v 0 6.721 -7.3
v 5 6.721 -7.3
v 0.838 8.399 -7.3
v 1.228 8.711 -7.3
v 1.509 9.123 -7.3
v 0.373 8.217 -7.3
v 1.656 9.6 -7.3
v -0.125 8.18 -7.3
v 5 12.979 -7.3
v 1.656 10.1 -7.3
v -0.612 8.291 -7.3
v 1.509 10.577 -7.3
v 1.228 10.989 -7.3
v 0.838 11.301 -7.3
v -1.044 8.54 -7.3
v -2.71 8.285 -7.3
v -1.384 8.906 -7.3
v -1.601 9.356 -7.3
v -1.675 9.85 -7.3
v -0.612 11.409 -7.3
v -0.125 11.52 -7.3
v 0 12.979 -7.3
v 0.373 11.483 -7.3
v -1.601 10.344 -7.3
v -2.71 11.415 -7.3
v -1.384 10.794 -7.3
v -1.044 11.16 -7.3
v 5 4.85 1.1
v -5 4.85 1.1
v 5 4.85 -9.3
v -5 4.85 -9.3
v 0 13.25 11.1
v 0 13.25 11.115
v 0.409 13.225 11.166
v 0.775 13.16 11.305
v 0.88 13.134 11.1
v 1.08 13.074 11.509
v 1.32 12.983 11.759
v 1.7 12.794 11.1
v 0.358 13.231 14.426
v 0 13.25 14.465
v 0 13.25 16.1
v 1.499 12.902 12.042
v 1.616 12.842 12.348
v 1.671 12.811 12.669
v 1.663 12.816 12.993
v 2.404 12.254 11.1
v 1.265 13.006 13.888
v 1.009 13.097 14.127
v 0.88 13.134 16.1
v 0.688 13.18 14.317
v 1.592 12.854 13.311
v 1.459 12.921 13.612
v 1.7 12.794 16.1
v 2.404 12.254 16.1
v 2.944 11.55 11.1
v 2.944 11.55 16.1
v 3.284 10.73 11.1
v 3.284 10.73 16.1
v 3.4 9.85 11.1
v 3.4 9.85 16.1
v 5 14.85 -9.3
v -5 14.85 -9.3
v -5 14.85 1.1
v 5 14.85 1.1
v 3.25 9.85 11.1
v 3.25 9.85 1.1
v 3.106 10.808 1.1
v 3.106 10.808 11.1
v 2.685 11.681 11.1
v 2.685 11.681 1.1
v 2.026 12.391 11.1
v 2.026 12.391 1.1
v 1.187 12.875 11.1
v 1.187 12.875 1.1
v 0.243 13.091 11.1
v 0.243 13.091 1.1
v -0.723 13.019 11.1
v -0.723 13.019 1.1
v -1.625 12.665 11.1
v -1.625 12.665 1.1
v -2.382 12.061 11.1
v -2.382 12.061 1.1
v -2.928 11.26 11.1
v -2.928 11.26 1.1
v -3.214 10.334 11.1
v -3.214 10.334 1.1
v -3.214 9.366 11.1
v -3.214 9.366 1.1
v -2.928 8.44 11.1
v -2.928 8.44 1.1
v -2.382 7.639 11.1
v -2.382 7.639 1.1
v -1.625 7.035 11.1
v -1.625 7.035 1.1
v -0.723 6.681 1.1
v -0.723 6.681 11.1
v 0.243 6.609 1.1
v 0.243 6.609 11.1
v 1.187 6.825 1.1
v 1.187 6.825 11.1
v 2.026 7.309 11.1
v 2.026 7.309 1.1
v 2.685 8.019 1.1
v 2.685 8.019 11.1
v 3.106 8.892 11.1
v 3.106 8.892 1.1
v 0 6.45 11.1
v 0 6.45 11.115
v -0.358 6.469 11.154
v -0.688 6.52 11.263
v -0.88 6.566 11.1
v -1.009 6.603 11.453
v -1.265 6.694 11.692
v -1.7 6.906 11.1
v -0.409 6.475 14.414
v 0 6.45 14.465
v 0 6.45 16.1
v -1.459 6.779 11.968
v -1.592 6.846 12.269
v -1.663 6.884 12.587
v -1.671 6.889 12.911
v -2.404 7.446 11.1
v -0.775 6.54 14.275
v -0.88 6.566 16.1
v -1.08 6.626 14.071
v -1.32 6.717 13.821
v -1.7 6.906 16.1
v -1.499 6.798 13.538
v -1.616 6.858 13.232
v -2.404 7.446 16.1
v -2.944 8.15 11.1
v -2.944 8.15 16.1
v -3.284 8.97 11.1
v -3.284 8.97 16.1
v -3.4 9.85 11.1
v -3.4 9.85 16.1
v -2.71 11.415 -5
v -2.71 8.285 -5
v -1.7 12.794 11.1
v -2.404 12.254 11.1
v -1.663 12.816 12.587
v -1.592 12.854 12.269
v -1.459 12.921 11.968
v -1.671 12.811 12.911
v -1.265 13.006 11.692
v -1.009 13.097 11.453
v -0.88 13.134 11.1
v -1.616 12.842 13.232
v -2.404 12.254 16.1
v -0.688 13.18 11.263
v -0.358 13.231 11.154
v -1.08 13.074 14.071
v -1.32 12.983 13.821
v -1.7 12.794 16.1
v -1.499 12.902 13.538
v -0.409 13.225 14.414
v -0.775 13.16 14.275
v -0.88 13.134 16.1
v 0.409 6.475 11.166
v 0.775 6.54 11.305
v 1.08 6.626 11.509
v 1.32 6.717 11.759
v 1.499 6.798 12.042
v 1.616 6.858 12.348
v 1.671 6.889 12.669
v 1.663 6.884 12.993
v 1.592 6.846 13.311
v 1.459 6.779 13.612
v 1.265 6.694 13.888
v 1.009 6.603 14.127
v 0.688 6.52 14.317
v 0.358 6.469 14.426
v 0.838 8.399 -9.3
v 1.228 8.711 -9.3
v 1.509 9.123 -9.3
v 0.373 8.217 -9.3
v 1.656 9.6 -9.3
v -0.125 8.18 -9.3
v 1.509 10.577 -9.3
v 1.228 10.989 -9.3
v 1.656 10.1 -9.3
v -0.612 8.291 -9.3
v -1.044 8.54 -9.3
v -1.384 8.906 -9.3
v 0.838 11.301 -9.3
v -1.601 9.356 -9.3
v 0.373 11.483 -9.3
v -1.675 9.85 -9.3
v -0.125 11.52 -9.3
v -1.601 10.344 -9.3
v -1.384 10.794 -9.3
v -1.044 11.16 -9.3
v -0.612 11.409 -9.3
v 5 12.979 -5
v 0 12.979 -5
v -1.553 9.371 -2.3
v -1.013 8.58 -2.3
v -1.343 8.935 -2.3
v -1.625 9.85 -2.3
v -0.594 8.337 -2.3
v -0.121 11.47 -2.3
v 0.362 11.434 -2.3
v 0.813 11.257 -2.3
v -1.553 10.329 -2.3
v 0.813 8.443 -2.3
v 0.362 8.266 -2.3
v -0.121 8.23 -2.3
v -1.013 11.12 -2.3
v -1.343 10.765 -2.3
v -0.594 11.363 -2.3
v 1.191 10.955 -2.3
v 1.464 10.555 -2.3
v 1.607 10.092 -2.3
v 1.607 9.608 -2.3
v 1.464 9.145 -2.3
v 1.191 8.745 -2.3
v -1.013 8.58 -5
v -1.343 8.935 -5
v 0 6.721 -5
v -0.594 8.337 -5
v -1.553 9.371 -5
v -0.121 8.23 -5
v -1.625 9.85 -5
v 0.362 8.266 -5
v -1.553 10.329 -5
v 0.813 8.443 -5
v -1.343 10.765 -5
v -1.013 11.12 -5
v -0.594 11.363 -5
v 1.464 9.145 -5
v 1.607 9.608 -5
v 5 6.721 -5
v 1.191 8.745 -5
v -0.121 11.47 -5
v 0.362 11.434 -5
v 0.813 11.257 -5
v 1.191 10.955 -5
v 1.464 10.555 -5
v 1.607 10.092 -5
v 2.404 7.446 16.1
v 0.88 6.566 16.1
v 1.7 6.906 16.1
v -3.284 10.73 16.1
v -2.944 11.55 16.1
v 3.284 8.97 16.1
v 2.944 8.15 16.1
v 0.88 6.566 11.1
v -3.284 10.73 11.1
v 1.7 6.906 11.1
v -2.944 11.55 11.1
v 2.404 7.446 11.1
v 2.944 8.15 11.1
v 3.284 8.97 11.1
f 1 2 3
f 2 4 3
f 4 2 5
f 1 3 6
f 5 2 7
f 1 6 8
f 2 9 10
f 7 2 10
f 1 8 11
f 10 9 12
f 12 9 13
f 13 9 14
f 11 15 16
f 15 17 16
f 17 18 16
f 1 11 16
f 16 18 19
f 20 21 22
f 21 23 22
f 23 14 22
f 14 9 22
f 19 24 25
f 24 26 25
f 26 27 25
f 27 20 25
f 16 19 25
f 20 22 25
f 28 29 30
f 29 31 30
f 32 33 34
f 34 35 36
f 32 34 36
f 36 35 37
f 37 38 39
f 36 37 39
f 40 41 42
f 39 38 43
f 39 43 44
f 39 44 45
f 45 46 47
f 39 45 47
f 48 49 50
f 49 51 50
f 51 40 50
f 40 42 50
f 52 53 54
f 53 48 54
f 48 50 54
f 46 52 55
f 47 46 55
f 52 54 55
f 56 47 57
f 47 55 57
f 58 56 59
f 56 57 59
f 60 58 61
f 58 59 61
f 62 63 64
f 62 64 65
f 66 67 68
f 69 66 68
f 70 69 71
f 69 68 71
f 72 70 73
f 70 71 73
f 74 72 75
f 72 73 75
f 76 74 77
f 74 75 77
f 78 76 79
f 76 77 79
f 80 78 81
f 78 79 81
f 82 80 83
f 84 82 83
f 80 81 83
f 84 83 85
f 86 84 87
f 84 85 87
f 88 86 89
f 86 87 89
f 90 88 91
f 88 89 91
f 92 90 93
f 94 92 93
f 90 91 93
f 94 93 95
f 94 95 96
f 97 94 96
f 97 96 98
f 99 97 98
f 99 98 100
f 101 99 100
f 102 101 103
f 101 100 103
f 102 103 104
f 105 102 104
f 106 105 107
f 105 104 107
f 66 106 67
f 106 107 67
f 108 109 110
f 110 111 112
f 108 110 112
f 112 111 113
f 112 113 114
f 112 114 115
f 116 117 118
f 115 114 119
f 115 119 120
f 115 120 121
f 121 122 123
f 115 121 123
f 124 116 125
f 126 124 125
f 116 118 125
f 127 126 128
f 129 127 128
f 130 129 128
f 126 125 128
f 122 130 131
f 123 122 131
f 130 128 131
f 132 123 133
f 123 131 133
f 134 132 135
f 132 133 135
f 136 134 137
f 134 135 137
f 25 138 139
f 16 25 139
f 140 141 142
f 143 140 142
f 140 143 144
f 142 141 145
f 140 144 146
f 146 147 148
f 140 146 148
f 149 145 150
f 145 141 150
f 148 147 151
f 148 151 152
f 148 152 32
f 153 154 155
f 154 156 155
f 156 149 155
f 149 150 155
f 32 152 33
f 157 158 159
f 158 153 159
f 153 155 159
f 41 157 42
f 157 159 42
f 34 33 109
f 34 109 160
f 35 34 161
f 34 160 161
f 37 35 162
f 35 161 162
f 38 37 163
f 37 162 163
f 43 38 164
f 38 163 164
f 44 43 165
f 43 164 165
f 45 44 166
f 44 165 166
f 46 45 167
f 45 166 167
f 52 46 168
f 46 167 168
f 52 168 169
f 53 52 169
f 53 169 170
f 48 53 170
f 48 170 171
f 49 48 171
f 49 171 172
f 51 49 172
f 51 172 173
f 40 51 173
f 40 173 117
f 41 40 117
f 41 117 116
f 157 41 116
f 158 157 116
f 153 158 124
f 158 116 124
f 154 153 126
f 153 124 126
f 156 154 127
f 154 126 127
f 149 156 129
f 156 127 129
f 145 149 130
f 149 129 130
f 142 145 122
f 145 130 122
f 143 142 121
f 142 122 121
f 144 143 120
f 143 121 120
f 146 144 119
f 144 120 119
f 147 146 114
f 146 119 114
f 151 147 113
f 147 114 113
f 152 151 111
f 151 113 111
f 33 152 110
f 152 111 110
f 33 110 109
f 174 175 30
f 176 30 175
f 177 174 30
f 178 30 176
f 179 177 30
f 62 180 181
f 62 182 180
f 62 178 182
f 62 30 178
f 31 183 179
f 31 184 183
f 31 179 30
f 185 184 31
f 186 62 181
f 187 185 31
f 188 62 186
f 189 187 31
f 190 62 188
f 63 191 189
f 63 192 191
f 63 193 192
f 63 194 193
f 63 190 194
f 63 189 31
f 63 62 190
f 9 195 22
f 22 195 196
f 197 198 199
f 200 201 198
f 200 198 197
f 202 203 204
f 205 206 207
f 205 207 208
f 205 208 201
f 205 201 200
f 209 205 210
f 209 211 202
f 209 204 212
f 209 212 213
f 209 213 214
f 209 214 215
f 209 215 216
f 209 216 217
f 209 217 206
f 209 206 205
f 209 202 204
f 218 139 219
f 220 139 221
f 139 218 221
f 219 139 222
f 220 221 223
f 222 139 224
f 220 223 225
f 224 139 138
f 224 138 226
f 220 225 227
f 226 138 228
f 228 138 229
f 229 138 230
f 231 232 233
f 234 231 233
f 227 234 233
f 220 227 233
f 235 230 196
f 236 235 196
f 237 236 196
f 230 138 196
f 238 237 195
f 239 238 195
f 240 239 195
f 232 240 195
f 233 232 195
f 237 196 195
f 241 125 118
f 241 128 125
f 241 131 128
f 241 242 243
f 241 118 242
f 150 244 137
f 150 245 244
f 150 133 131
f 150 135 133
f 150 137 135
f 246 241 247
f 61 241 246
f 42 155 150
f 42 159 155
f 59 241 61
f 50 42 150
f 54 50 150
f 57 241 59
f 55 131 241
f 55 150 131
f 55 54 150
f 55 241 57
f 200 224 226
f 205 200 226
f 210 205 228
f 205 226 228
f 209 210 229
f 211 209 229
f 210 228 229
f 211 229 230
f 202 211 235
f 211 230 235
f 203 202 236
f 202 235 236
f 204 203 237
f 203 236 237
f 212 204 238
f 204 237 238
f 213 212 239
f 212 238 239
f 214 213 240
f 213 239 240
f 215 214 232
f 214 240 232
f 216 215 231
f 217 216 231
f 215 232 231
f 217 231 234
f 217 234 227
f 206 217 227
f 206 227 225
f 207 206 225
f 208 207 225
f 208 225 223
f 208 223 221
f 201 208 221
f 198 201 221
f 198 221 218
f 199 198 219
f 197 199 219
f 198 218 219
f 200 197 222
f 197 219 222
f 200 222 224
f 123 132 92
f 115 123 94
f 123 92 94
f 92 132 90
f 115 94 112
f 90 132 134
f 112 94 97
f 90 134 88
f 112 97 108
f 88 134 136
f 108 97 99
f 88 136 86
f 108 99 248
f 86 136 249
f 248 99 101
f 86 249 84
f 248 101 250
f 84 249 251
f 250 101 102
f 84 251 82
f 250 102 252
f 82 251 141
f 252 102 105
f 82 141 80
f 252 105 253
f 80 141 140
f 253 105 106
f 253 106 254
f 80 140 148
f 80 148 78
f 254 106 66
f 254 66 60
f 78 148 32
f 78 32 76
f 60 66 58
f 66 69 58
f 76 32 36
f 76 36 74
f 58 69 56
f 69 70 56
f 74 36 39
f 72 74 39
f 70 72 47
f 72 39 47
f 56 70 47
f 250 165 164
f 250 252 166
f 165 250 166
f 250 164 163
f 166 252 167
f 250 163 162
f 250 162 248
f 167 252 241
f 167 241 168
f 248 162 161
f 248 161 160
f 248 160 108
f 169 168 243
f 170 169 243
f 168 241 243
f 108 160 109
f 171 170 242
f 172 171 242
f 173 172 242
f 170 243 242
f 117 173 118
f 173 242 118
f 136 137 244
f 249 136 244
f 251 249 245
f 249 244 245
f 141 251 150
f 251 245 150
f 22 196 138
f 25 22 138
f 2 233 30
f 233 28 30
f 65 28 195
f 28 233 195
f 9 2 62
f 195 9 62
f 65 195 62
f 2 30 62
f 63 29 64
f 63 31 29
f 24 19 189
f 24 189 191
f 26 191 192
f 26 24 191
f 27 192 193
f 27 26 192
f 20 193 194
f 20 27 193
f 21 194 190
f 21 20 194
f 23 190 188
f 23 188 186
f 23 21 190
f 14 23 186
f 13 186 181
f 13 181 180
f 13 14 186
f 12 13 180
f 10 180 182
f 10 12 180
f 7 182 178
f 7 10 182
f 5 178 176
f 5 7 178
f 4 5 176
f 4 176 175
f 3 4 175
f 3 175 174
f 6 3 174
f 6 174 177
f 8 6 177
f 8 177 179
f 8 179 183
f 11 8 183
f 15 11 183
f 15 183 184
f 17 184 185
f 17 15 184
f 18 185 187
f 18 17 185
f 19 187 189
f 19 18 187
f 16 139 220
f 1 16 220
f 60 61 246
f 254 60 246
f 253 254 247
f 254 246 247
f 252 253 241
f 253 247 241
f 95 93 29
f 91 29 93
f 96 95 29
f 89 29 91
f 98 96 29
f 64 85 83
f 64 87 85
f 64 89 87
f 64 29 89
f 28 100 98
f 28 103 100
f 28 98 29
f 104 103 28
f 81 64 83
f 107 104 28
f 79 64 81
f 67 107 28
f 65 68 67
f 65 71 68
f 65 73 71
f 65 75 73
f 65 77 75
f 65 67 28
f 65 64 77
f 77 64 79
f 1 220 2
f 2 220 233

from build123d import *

# Parameters (mm, degrees)
SKETCH1_W               = 10
SKETCH1_H               = 10
BOSS_EXTRUDE1_DEPTH     = 5
CUT_EXTRUDE1_DEPTH      = 9.660254038
CUT_EXTRUDE1_DEPTH_BACK = 9.660254038
SKETCH2_R               = 1.675
SKETCH3_R               = 1.675
CUT_EXTRUDE3_DEPTH      = 2.3
SKETCH4_W               = 10
SKETCH4_H               = 10
BOSS_EXTRUDE2_DEPTH     = 2.7
SKETCH6_W               = 10
SKETCH6_H               = 10
BOSS_EXTRUDE3_DEPTH     = 7
SKETCH9_R               = 2.15
CUT_EXTRUDE12_DEPTH     = 19.468622038
SKETCH10_R              = 1.675
CUT_EXTRUDE13_DEPTH     = 13.003749414
BOSS_EXTRUDE4_DEPTH     = 2.3
SKETCH12_W              = 10
SKETCH12_H              = 10
BOSS_EXTRUDE5_DEPTH     = 2.7
CUT_EXTRUDE14_START     = -2.7
SKETCH13_R              = 1.675
CUT_EXTRUDE14_DEPTH     = 2.7
SKETCH14_R              = 2.15
BOSS_EXTRUDE6_DEPTH     = 0.76
SKETCH16_W              = 10
SKETCH16_H              = 19.7
CUT_EXTRUDE15_DEPTH     = 2.29
BOSS_EXTRUDE7_START     = 1
SKETCH17_W              = 10
SKETCH17_H              = 7.71
SKETCH17_R              = 1.675
BOSS_EXTRUDE7_DEPTH     = 1
SKETCH18_W              = 10
SKETCH18_H              = 7.71
SKETCH18_R              = 1.675
BOSS_EXTRUDE9_DEPTH     = 1
BOSS_EXTRUDE13_DEPTH    = 2.3
SKETCH23_W              = 10
SKETCH23_H              = 10
SKETCH23_R              = 1.675
BOSS_EXTRUDE15_DEPTH    = 2
SKETCH24_W              = 10
SKETCH24_H              = 5.85
CUT_EXTRUDE16_DEPTH     = 25.448519432
SKETCH25_W              = 10
SKETCH25_H              = 10
BOSS_EXTRUDE16_DEPTH    = 6
SKETCH26_W              = 10
SKETCH26_H              = 10
CUT_EXTRUDE17_DEPTH     = 7.71
SKETCH27_W              = 10
SKETCH27_H              = 10
BOSS_EXTRUDE17_DEPTH    = 6.1
SKETCH28_R              = 3.25
BOSS_EXTRUDE18_DEPTH    = 10
SKETCH29_R              = 1.625
CUT_EXTRUDE18_DEPTH     = 2.7
SKETCH33_W              = 6.8
SKETCH33_H              = 6.8
BOSS_EXTRUDE19_DEPTH    = 5
SKETCH36_R              = 1.675
CUT_EXTRUDE22_DEPTH     = 10
CUT_EXTRUDE23_DEPTH     = 10


with BuildPart() as part:
    # Sketch1 → Boss-Extrude1 (new body)
    with BuildSketch(Plane(origin=(0, 0, 0), x_dir=(1, 0, 0), z_dir=(0, 1, 0))):
        Rectangle(SKETCH1_W, SKETCH1_H)
    extrude(amount=BOSS_EXTRUDE1_DEPTH)

    # Sketch2 → Cut-Extrude1 (cut, two sides: drawn at the far end of the back side and taken through both)
    with BuildSketch(Plane(origin=(0, 5, 0), x_dir=(1, 0, 0), z_dir=(0, 1, 0)).offset(-CUT_EXTRUDE1_DEPTH_BACK)):
        with Locations(Location((0, 0, 0), (0, 0, 270))):
            Circle(SKETCH2_R)
    extrude(amount=CUT_EXTRUDE1_DEPTH + CUT_EXTRUDE1_DEPTH_BACK, mode=Mode.SUBTRACT)

    # Sketch3 → Cut-Extrude3 (cut)
    # profile 1 of 2: a face of its own
    with BuildSketch(Plane(origin=(0, 5, 0), x_dir=(1, 0, 0), z_dir=(0, 1, 0))):
        Polygon((-1.56461923, -2.71), (1.56461923, -2.71), (3.129238459, 0), (1.56461923, 2.71), (-1.56461923, 2.71), (-3.129238459, 0), align=None)
        with Locations(Location((0, 0, 0), (0, 0, 270))):
            Circle(SKETCH3_R, mode=Mode.SUBTRACT)
    # profile 2 of 2: a face of its own
    with BuildSketch(Plane(origin=(0, 5, 0), x_dir=(1, 0, 0), z_dir=(0, 1, 0))):
        Polygon((-1.56461923, -2.71), (-3.129238459, 0), (-3.129238459, -5), (3.129238459, -5), (3.129238459, 0), (1.56461923, -2.71), align=None)
    extrude(amount=-CUT_EXTRUDE3_DEPTH, mode=Mode.SUBTRACT)

    # Sketch4 → Boss-Extrude2 (add)
    with BuildSketch(Plane(origin=(0, 5, 0), x_dir=(1, 0, 0), z_dir=(0, 1, 0))):
        Rectangle(SKETCH4_W, SKETCH4_H)
    extrude(amount=BOSS_EXTRUDE2_DEPTH)

    # Sketch6 → Boss-Extrude3 (add)
    with BuildSketch(Plane(origin=(0, 7.7, 0), x_dir=(1, 0, 0), z_dir=(0, 1, 0))):
        Rectangle(SKETCH6_W, SKETCH6_H)
    extrude(amount=BOSS_EXTRUDE3_DEPTH)

    # Sketch9 → Cut-Extrude12 (cut, through all)
    with BuildSketch(Plane(origin=(0, 0, -5), x_dir=(-1, 0, 0), z_dir=(0, 0, -1))):
        with Locations((0, 9.85)):
            Circle(SKETCH9_R)
    extrude(amount=-CUT_EXTRUDE12_DEPTH, mode=Mode.SUBTRACT)

    # Sketch10 → Cut-Extrude13 (cut, through all)
    with BuildSketch(Plane.XZ.offset(-5)):
        with Locations(Location((0, 0, 0), (0, 0, 90))):
            Circle(SKETCH10_R)
    extrude(amount=-CUT_EXTRUDE13_DEPTH, mode=Mode.SUBTRACT)

    # Sketch11 → Boss-Extrude4 (add)
    with BuildSketch(Plane(origin=(0, 14.7, 0), x_dir=(1, 0, 0), z_dir=(0, 1, 0))):
        Polygon((1.56461923, 2.71), (3.129238459, 0), (3.129238459, -5), (5, -5), (5, 5), (-5, 5), (-5, -5), (-3.129238459, -5), (-3.129238459, 0), (-1.56461923, 2.71), align=None)
    extrude(amount=BOSS_EXTRUDE4_DEPTH)

    # Sketch12 → Boss-Extrude5 (add)
    with BuildSketch(Plane(origin=(0, 17, 0), x_dir=(1, 0, 0), z_dir=(0, 1, 0))):
        Rectangle(SKETCH12_W, SKETCH12_H)
    extrude(amount=BOSS_EXTRUDE5_DEPTH)

    # Sketch13 → Cut-Extrude14 (cut)
    with BuildSketch(Plane(origin=(0, 19.7, 0), x_dir=(1, 0, 0), z_dir=(0, 1, 0)).offset(CUT_EXTRUDE14_START)):
        with Locations(Location((0, 0, 0), (0, 0, 270))):
            Circle(SKETCH13_R)
    extrude(amount=CUT_EXTRUDE14_DEPTH, mode=Mode.SUBTRACT)

    # Sketch16 → Cut-Extrude15 (cut)
    with BuildSketch(Plane.XY.offset(5)):
        with Locations((0, 9.85)):
            Rectangle(SKETCH16_W, SKETCH16_H)
    extrude(amount=-CUT_EXTRUDE15_DEPTH, mode=Mode.SUBTRACT)

    # Sketch17 → Boss-Extrude7 (add)
    with BuildSketch(Plane(origin=(0, 0, 0), x_dir=(-1, 0, 0), z_dir=(0, -1, 0)).offset(BOSS_EXTRUDE7_START)):
        with Locations((0, 1.145)):
            Rectangle(SKETCH17_W, SKETCH17_H)
        with Locations(Location((0, 0, 0), (0, 0, 270))):
            Circle(SKETCH17_R, mode=Mode.SUBTRACT)
    extrude(amount=-BOSS_EXTRUDE7_DEPTH)

    # Sketch18 → Boss-Extrude9 (add)
    with BuildSketch(Plane(origin=(0, 19.7, 0), x_dir=(1, 0, 0), z_dir=(0, 1, 0))):
        with Locations((0, 1.145)):
            Rectangle(SKETCH18_W, SKETCH18_H)
        with Locations(Location((0, 0, 0), (0, 0, 270))):
            Circle(SKETCH18_R, mode=Mode.SUBTRACT)
    extrude(amount=BOSS_EXTRUDE9_DEPTH)


with BuildPart() as body_2:
    # Sketch14 → Boss-Extrude6 (new body)
    with BuildSketch(Plane(origin=(0, 0, -5), x_dir=(-1, 0, 0), z_dir=(0, 0, -1))):
        with Locations((0, 9.85)):
            Circle(SKETCH14_R)
    extrude(amount=-BOSS_EXTRUDE6_DEPTH)


    add(part.part)  # Boss-Extrude13 merges part
    # Sketch22 → Boss-Extrude13 (add)
    with BuildSketch(Plane(origin=(0, 0, -5), x_dir=(-1, 0, 0), z_dir=(0, 0, -1))):
        Polygon((-5, 12.979238459), (0, 12.979238459), (2.71, 11.41461923), (2.71, 8.28538077), (0, 6.720761541), (-5, 6.720761541), (-5, 4.85), (5, 4.85), (5, 14.85), (-5, 14.85), align=None)
    extrude(amount=BOSS_EXTRUDE13_DEPTH)

    # Sketch23 → Boss-Extrude15 (add)
    with BuildSketch(Plane(origin=(0, 0, -7.3), x_dir=(-1, 0, 0), z_dir=(0, 0, -1))):
        with Locations((0, 9.85)):
            Rectangle(SKETCH23_W, SKETCH23_H)
        with Locations((0, 9.85)):
            Circle(SKETCH23_R, mode=Mode.SUBTRACT)
    extrude(amount=BOSS_EXTRUDE15_DEPTH)

    # Sketch24 → Cut-Extrude16 (cut, through all)
    with BuildSketch(Plane(origin=(0, 0, -9.3), x_dir=(-1, 0, 0), z_dir=(0, 0, -1))):
        with Locations((0, 17.775)):
            Rectangle(SKETCH24_W, SKETCH24_H)
        with Locations((0, 1.925)):
            Rectangle(SKETCH24_W, SKETCH24_H)
    extrude(amount=-CUT_EXTRUDE16_DEPTH, mode=Mode.SUBTRACT)

    # Sketch25 → Boss-Extrude16 (add)
    with BuildSketch(Plane.XY.offset(2.71)):
        with Locations((0, 9.85)):
            Rectangle(SKETCH25_W, SKETCH25_H)
    extrude(amount=-BOSS_EXTRUDE16_DEPTH)

    # Sketch26 → Cut-Extrude17 (cut)
    with BuildSketch(Plane.XY.offset(2.71)):
        with Locations((0, 9.85)):
            Rectangle(SKETCH26_W, SKETCH26_H)
    extrude(amount=-CUT_EXTRUDE17_DEPTH, mode=Mode.SUBTRACT)

    # Sketch27 → Boss-Extrude17 (add)
    with BuildSketch(Plane.XY.offset(-5)):
        with Locations((0, 9.85)):
            Rectangle(SKETCH27_W, SKETCH27_H)
    extrude(amount=BOSS_EXTRUDE17_DEPTH)

    # Sketch28 → Boss-Extrude18 (add)
    with BuildSketch(Plane.XY.offset(1.1)):
        with Locations((0, 9.85)):
            Circle(SKETCH28_R)
    extrude(amount=BOSS_EXTRUDE18_DEPTH)

    # Sketch29 → Cut-Extrude18 (cut)
    with BuildSketch(Plane(origin=(0, 0, -5), x_dir=(-1, 0, 0), z_dir=(0, 0, -1))):
        with Locations((0, 9.85)):
            Circle(SKETCH29_R)
    extrude(amount=-CUT_EXTRUDE18_DEPTH, mode=Mode.SUBTRACT)

    # Sketch33 → Boss-Extrude19 (add)
    with BuildSketch(Plane.XY.offset(11.1)):
        with Locations((0, 9.85)):
            Rectangle(SKETCH33_W, SKETCH33_H)
    extrude(amount=BOSS_EXTRUDE19_DEPTH)

    # Sketch36 → Cut-Extrude22 (cut)
    with BuildSketch(Plane(origin=(0, 6.45, 0), x_dir=(-1, 0, 0), z_dir=(0, -1, 0))):
        with Locations(Location((0, -12.79, 0), (0, 0, 90))):
            Circle(SKETCH36_R)
    extrude(amount=-CUT_EXTRUDE22_DEPTH, mode=Mode.SUBTRACT)

    # Sketch37 → Cut-Extrude23 (cut)
    with BuildSketch(Plane.XY.offset(16.1)):
        with BuildLine():
            Line((0, 13.25), (-3.4, 13.25))
            Line((-3.4, 13.25), (-2.404163056, 12.254163056))
            ThreePointArc((-2.404163056, 12.254163056), (-1.30112367, 12.991190411), (0, 13.25))
        make_face()
        with BuildLine():
            Line((-2.404163056, 12.254163056), (-3.4, 13.25))
            Line((-3.4, 13.25), (-3.4, 9.85))
            ThreePointArc((-3.4, 9.85), (-3.141190411, 11.15112367), (-2.404163056, 12.254163056))
        make_face()
        with BuildLine():
            ThreePointArc((0, 6.45), (-2.404163056, 7.445836944), (-3.4, 9.85))
            Line((-3.4, 9.85), (-3.4, 6.45))
            Line((-3.4, 6.45), (0, 6.45))
        make_face()
        with BuildLine():
            Line((3.4, 6.45), (2.404163056, 7.445836944))
            ThreePointArc((2.404163056, 7.445836944), (1.30112367, 6.708809589), (0, 6.45))
            Line((0, 6.45), (3.4, 6.45))
        make_face()
        with BuildLine():
            ThreePointArc((3.4, 9.85), (3.141190411, 8.54887633), (2.404163056, 7.445836944))
            Line((2.404163056, 7.445836944), (3.4, 6.45))
            Line((3.4, 6.45), (3.4, 9.85))
        make_face()
        with BuildLine():
            Line((3.4, 13.25), (0, 13.25))
            ThreePointArc((0, 13.25), (2.404163056, 12.254163056), (3.4, 9.85))
            Line((3.4, 9.85), (3.4, 13.25))
        make_face()
    extrude(amount=-CUT_EXTRUDE23_DEPTH, mode=Mode.SUBTRACT)


solid = body_2.part
